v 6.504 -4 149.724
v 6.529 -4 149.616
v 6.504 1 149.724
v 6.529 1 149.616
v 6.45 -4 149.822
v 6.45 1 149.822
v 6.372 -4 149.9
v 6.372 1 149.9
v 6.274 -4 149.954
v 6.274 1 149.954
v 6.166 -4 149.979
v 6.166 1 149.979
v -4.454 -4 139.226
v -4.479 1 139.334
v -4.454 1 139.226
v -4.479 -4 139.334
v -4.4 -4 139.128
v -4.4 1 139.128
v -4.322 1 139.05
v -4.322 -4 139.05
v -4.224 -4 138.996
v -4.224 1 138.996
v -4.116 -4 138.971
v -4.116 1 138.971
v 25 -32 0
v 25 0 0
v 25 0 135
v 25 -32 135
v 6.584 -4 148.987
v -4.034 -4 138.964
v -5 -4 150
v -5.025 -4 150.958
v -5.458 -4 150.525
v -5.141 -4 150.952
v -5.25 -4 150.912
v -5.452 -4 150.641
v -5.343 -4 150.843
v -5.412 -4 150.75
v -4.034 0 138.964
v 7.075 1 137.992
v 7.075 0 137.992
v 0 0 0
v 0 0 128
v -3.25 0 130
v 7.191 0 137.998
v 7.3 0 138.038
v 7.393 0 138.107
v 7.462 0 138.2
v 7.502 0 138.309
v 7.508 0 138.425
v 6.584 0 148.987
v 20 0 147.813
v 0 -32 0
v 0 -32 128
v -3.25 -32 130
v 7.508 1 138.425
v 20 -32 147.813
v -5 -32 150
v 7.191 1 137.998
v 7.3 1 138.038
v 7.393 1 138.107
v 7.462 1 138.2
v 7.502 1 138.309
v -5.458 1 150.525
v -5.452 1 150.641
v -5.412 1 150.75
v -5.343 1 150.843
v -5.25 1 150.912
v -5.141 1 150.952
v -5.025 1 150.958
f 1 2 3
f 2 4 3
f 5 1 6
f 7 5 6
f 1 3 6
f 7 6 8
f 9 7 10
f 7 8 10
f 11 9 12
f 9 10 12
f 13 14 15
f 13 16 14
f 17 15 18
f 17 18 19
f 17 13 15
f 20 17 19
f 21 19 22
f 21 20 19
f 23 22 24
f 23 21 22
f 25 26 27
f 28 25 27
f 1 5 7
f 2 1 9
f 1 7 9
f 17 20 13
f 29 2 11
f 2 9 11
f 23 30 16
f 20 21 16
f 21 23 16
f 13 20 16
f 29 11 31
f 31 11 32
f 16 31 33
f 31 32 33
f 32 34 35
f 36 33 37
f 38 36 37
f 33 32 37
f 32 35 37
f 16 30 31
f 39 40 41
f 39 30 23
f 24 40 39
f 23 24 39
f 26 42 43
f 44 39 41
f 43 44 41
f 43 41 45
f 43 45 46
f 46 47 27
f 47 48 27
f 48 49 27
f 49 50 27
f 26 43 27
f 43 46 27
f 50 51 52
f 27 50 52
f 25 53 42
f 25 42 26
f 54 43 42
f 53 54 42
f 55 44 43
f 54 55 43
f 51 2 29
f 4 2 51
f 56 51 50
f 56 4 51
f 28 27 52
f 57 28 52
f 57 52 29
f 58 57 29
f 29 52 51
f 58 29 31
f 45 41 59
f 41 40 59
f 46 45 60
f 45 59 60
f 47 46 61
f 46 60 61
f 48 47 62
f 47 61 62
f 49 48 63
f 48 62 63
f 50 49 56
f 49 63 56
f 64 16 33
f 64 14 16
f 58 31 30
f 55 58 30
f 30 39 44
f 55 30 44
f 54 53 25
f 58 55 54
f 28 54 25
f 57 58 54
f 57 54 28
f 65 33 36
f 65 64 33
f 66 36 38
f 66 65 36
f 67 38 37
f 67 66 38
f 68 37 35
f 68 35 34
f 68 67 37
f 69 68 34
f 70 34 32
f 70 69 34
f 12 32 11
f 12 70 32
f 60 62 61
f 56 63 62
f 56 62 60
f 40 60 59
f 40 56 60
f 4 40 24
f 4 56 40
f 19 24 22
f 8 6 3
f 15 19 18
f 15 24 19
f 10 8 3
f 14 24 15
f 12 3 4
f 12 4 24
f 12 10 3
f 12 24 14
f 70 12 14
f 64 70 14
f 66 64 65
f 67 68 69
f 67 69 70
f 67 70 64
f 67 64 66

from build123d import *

# Parameters (mm, degrees)
F1_DEPTH      = 32
F3_DEPTH      = 1
F3_DEPTH_BACK = 4
F4_R          = 0.4


with BuildPart() as f1:
    # F0 (on Front) → F1 (new body)
    with BuildSketch(Plane.XZ):
        Polygon((0, 128), (0, 0), (25, 0), (25, 135), (20, 147.812783), (-5, 150), (-3.250227, 130), align=None)
    extrude(amount=F1_DEPTH)

    # F2 (on face) → F3 (join, two sides)
    with BuildSketch(Plane(origin=(0, 0, 0), x_dir=(-1, 0, 0), z_dir=(0, 1, 0))) as f3_sk:
        Polygon((4.450136, 139), (5.5, 151), (-6.5, 149.950136), (-7.549864, 137.950136), align=None)
    extrude(amount=F3_DEPTH)
    extrude(f3_sk.sketch, amount=-F3_DEPTH_BACK)

    # F4
    f4_edges = [f1.edges().sort_by_distance(p)[0] for p in [
        (-5.5, -1.5, 151),
        (6.5, -1.5, 149.950136),
        (-4.450136, -1.5, 139),
        (7.549864, 0.5, 137.950136),
    ]]
    fillet(f4_edges, radius=F4_R)


solid = f1.part
